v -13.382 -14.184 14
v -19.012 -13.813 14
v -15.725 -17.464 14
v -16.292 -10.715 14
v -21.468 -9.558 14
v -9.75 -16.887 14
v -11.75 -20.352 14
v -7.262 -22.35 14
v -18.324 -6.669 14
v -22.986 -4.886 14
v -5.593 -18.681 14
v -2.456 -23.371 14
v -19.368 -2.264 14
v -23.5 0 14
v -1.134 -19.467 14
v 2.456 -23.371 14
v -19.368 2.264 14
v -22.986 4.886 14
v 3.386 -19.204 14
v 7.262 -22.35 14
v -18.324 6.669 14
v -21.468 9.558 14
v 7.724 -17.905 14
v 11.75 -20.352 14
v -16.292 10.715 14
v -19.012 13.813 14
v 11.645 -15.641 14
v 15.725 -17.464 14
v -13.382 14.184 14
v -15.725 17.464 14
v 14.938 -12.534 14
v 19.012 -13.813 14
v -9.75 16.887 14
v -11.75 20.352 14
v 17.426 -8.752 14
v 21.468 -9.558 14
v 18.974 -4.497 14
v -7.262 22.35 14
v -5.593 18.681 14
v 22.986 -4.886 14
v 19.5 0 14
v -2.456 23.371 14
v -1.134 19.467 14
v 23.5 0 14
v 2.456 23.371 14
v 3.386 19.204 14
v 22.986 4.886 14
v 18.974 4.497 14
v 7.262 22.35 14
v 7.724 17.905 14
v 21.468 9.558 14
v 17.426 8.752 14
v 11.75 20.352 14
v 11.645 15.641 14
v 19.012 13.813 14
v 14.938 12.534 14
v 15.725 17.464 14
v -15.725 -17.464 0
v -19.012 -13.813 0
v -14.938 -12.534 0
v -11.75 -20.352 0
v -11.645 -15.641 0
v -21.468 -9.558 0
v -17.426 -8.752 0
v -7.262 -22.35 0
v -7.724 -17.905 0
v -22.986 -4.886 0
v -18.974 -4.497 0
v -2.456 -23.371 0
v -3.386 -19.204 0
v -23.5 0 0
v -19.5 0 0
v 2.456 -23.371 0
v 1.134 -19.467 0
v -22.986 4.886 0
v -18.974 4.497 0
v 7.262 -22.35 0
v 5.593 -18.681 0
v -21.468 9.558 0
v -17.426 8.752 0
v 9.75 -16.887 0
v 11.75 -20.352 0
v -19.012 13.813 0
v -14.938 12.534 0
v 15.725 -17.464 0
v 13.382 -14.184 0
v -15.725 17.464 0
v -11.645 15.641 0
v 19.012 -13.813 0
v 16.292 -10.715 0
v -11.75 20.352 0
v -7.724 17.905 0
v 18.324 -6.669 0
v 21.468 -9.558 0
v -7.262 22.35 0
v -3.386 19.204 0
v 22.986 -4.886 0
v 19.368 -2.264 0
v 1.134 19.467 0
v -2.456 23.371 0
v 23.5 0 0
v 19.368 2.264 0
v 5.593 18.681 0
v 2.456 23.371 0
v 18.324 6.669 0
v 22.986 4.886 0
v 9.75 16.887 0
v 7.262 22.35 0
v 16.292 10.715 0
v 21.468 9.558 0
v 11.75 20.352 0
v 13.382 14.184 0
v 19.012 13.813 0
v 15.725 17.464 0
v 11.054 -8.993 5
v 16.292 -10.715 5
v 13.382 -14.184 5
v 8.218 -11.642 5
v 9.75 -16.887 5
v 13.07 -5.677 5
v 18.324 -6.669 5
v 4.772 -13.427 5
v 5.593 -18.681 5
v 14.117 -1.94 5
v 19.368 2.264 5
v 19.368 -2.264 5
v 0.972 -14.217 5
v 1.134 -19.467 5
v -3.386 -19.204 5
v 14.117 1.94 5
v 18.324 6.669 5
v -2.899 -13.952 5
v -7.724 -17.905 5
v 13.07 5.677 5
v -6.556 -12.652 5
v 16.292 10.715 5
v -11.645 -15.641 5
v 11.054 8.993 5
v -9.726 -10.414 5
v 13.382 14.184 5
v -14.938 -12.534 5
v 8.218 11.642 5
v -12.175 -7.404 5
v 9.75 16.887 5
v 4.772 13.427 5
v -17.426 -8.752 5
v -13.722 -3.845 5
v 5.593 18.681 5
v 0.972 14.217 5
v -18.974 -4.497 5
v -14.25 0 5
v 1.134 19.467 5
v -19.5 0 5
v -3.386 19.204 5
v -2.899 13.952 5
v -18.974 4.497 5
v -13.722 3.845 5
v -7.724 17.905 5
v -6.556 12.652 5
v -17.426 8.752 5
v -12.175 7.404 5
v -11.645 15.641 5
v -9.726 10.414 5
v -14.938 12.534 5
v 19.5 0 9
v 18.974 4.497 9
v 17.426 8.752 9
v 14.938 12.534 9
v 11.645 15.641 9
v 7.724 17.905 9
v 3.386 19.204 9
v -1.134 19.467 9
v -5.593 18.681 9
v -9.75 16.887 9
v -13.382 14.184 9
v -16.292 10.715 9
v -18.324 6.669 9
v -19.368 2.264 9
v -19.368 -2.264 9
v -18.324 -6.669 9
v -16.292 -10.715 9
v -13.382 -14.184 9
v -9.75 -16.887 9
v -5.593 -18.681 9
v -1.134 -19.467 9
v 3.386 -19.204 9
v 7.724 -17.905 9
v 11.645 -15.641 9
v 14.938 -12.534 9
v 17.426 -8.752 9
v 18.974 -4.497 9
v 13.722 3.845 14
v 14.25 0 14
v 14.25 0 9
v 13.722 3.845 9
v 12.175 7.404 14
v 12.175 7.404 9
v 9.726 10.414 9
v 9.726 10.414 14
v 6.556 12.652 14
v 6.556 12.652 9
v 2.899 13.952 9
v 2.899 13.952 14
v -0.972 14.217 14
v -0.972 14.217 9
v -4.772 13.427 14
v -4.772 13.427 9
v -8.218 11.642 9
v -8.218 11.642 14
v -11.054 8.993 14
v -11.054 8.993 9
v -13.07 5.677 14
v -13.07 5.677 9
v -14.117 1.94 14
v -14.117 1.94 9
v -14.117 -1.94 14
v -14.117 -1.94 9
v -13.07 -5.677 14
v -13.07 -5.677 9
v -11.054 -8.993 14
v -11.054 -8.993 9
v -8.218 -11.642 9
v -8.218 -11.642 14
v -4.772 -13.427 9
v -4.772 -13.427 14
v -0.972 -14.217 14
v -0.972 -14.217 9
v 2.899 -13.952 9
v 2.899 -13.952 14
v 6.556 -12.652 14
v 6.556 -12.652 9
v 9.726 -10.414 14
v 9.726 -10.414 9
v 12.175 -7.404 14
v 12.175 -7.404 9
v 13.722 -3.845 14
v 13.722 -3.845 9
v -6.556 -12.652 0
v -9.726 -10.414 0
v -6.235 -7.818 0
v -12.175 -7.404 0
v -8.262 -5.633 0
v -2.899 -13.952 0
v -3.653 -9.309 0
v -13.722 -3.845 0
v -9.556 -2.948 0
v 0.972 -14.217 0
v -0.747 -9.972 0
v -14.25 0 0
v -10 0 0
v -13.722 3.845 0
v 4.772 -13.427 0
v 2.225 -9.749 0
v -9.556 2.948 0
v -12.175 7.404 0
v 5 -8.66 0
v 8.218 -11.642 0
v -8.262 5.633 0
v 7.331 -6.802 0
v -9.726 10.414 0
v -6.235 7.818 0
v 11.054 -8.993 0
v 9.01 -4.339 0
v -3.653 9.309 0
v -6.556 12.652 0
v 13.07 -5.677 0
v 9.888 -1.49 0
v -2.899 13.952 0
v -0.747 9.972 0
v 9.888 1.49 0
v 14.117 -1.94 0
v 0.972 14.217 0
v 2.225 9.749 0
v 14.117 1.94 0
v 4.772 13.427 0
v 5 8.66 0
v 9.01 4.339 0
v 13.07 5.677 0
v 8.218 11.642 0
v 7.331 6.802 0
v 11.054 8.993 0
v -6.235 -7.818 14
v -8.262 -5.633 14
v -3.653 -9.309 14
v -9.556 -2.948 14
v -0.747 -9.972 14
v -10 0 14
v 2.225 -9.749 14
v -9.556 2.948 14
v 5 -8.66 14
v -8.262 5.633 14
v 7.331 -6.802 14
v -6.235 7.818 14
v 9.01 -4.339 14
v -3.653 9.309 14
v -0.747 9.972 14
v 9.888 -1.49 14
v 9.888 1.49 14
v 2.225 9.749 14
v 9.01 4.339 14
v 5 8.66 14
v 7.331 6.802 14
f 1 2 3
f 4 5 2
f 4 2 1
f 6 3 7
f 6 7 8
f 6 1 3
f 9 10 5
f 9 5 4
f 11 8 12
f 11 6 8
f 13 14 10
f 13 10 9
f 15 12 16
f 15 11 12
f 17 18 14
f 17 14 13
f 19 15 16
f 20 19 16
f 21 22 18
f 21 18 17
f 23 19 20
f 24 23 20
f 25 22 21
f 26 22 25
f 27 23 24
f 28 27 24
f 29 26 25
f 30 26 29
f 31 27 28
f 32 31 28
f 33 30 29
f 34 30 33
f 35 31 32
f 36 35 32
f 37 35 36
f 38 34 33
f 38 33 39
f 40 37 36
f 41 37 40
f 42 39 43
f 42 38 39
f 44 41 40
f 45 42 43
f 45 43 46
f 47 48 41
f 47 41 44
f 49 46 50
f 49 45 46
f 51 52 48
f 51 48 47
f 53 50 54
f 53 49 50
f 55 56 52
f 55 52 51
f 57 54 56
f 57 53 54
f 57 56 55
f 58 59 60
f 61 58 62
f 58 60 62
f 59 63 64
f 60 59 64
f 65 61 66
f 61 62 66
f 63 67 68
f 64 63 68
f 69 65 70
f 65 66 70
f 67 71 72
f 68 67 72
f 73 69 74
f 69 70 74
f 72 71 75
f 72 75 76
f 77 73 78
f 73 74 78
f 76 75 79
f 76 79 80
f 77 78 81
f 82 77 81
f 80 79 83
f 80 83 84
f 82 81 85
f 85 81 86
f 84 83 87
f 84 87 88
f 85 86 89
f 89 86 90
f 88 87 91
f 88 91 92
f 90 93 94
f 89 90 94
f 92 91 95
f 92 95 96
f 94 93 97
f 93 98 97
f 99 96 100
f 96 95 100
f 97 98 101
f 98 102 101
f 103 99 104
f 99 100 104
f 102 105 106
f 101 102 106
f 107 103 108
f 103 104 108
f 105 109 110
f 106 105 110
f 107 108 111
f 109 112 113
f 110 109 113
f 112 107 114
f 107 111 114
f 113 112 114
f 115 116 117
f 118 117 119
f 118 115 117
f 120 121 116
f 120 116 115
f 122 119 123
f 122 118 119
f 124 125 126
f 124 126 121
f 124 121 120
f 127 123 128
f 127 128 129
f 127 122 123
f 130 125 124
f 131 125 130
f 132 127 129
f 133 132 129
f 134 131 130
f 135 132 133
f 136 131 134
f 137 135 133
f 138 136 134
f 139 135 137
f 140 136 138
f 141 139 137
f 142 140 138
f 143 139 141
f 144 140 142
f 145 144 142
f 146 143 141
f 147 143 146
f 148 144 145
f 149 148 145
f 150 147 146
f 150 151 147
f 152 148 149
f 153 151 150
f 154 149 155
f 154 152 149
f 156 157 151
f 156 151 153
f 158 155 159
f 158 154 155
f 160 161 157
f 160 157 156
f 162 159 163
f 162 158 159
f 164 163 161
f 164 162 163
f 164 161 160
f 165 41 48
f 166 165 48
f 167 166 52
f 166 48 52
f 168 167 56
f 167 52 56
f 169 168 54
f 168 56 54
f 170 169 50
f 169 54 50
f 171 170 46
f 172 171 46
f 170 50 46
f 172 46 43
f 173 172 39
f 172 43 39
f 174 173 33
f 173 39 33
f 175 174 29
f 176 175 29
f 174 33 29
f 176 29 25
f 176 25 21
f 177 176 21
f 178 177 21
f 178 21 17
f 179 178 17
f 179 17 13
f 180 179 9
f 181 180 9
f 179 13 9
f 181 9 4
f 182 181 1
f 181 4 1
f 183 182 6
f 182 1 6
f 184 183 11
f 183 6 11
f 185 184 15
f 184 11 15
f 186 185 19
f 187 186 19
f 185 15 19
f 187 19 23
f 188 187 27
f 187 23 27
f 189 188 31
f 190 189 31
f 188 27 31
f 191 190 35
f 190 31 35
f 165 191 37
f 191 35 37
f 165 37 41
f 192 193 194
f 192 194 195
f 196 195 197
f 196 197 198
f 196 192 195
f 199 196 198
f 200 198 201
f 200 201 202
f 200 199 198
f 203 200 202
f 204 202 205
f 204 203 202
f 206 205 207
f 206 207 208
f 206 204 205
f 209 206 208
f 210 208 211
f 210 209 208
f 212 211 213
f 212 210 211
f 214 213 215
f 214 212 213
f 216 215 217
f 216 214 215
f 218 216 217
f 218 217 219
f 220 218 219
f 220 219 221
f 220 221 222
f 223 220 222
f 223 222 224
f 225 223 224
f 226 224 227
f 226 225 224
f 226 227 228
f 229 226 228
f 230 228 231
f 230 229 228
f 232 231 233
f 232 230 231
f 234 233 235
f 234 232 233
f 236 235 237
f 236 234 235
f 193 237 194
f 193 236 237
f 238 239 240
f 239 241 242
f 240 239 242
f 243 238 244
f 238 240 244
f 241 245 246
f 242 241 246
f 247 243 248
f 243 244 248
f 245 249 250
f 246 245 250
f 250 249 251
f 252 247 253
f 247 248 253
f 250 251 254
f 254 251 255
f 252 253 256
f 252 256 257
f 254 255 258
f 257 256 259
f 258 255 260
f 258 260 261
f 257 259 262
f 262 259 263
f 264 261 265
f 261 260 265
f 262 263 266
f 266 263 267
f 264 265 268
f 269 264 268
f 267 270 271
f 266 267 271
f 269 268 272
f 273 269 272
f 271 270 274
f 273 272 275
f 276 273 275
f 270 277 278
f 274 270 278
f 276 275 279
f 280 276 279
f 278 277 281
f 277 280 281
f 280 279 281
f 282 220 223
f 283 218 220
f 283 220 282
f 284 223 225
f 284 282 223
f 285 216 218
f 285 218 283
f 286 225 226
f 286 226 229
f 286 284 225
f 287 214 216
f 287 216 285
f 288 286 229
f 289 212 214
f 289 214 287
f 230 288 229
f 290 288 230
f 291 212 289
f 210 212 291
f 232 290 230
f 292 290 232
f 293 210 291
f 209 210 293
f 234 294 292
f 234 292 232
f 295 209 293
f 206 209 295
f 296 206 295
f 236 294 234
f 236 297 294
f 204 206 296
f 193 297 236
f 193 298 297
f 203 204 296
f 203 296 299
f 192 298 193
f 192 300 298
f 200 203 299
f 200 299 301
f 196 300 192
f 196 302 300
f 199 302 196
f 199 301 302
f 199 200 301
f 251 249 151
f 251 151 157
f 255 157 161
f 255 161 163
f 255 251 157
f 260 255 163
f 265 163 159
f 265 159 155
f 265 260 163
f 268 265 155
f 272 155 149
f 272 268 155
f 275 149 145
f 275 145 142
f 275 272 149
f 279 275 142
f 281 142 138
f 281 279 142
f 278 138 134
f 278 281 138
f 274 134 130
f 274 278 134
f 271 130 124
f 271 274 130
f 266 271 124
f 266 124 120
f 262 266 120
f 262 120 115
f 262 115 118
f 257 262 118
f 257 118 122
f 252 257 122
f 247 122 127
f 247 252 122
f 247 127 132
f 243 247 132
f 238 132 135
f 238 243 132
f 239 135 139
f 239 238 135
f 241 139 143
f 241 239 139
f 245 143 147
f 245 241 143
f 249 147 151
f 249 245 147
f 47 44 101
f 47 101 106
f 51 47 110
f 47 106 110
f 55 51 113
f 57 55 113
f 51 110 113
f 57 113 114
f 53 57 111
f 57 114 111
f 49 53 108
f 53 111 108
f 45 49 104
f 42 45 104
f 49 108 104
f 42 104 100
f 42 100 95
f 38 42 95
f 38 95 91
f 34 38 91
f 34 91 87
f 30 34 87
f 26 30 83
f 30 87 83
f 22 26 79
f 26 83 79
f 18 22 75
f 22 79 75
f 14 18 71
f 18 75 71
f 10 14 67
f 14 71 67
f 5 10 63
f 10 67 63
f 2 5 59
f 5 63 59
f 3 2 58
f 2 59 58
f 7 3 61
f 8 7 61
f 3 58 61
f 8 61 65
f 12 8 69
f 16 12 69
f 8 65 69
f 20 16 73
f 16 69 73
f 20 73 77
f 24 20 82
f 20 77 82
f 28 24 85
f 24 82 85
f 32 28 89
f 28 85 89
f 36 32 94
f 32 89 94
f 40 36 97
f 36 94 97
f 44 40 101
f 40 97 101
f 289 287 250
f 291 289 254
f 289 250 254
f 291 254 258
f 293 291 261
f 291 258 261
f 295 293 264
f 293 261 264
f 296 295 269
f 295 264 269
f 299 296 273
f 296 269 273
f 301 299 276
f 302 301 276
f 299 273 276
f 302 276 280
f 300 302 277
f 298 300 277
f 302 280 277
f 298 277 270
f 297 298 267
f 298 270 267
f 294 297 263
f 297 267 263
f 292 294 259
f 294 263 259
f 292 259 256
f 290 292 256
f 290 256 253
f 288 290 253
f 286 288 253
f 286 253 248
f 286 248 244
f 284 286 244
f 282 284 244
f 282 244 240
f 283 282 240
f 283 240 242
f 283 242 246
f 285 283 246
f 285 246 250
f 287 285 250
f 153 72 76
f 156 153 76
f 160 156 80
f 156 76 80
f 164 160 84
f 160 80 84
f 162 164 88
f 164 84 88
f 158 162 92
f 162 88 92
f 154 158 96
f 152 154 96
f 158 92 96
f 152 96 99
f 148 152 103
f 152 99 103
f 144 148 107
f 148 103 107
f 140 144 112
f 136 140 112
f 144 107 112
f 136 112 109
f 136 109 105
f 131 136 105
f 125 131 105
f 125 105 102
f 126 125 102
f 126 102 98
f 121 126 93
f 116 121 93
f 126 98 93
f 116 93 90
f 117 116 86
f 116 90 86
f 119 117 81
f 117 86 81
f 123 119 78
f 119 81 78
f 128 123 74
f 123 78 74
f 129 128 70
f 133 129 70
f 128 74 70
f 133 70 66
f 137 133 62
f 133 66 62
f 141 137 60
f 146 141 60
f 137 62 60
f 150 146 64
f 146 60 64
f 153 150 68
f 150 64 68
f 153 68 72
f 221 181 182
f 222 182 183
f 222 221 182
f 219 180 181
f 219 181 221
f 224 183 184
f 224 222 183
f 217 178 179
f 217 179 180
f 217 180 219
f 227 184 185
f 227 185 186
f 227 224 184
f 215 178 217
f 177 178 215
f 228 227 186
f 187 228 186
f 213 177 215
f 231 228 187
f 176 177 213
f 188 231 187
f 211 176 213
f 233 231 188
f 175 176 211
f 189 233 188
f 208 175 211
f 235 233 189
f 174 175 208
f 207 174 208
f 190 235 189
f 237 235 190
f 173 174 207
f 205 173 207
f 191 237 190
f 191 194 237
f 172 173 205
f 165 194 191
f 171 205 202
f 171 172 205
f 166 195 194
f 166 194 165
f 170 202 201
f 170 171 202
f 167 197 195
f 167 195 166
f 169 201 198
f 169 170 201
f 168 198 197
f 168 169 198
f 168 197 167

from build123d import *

# Parameters (mm, degrees)
SKETCH1_R      = 23.5
EXTRUDE1_DEPTH = 14
SKETCH2_R      = 19.5
SKETCH2_R_2    = 14.25
EXTRUDE2_DEPTH = 5
SKETCH3_R      = 19.5
SKETCH3_R_2    = 14.25
EXTRUDE3_DEPTH = 5
SKETCH4_R      = 10
EXTRUDE4_DEPTH = 15


with BuildPart() as part:
    # Sketch1 → Extrude1 (new body)
    with BuildSketch(Plane.XY):
        Circle(SKETCH1_R)
    extrude(amount=EXTRUDE1_DEPTH)

    # Sketch2 → Extrude2 (cut)
    with BuildSketch(Plane.XY.offset(14)):
        Circle(SKETCH2_R)
        Circle(SKETCH2_R_2, mode=Mode.SUBTRACT)
    extrude(amount=-EXTRUDE2_DEPTH, mode=Mode.SUBTRACT)

    # Sketch3 → Extrude3 (cut)
    with BuildSketch(Plane(origin=(0, 0, 0), x_dir=(-1, 0, 0), z_dir=(0, 0, -1))):
        Circle(SKETCH3_R)
        Circle(SKETCH3_R_2, mode=Mode.SUBTRACT)
    extrude(amount=-EXTRUDE3_DEPTH, mode=Mode.SUBTRACT)

    # Sketch4 → Extrude4 (cut, through all)
    with BuildSketch(Plane(origin=(0, 0, 0), x_dir=(-1, 0, 0), z_dir=(0, 0, -1))):
        Circle(SKETCH4_R)
    extrude(amount=-EXTRUDE4_DEPTH, mode=Mode.SUBTRACT)


solid = part.part
